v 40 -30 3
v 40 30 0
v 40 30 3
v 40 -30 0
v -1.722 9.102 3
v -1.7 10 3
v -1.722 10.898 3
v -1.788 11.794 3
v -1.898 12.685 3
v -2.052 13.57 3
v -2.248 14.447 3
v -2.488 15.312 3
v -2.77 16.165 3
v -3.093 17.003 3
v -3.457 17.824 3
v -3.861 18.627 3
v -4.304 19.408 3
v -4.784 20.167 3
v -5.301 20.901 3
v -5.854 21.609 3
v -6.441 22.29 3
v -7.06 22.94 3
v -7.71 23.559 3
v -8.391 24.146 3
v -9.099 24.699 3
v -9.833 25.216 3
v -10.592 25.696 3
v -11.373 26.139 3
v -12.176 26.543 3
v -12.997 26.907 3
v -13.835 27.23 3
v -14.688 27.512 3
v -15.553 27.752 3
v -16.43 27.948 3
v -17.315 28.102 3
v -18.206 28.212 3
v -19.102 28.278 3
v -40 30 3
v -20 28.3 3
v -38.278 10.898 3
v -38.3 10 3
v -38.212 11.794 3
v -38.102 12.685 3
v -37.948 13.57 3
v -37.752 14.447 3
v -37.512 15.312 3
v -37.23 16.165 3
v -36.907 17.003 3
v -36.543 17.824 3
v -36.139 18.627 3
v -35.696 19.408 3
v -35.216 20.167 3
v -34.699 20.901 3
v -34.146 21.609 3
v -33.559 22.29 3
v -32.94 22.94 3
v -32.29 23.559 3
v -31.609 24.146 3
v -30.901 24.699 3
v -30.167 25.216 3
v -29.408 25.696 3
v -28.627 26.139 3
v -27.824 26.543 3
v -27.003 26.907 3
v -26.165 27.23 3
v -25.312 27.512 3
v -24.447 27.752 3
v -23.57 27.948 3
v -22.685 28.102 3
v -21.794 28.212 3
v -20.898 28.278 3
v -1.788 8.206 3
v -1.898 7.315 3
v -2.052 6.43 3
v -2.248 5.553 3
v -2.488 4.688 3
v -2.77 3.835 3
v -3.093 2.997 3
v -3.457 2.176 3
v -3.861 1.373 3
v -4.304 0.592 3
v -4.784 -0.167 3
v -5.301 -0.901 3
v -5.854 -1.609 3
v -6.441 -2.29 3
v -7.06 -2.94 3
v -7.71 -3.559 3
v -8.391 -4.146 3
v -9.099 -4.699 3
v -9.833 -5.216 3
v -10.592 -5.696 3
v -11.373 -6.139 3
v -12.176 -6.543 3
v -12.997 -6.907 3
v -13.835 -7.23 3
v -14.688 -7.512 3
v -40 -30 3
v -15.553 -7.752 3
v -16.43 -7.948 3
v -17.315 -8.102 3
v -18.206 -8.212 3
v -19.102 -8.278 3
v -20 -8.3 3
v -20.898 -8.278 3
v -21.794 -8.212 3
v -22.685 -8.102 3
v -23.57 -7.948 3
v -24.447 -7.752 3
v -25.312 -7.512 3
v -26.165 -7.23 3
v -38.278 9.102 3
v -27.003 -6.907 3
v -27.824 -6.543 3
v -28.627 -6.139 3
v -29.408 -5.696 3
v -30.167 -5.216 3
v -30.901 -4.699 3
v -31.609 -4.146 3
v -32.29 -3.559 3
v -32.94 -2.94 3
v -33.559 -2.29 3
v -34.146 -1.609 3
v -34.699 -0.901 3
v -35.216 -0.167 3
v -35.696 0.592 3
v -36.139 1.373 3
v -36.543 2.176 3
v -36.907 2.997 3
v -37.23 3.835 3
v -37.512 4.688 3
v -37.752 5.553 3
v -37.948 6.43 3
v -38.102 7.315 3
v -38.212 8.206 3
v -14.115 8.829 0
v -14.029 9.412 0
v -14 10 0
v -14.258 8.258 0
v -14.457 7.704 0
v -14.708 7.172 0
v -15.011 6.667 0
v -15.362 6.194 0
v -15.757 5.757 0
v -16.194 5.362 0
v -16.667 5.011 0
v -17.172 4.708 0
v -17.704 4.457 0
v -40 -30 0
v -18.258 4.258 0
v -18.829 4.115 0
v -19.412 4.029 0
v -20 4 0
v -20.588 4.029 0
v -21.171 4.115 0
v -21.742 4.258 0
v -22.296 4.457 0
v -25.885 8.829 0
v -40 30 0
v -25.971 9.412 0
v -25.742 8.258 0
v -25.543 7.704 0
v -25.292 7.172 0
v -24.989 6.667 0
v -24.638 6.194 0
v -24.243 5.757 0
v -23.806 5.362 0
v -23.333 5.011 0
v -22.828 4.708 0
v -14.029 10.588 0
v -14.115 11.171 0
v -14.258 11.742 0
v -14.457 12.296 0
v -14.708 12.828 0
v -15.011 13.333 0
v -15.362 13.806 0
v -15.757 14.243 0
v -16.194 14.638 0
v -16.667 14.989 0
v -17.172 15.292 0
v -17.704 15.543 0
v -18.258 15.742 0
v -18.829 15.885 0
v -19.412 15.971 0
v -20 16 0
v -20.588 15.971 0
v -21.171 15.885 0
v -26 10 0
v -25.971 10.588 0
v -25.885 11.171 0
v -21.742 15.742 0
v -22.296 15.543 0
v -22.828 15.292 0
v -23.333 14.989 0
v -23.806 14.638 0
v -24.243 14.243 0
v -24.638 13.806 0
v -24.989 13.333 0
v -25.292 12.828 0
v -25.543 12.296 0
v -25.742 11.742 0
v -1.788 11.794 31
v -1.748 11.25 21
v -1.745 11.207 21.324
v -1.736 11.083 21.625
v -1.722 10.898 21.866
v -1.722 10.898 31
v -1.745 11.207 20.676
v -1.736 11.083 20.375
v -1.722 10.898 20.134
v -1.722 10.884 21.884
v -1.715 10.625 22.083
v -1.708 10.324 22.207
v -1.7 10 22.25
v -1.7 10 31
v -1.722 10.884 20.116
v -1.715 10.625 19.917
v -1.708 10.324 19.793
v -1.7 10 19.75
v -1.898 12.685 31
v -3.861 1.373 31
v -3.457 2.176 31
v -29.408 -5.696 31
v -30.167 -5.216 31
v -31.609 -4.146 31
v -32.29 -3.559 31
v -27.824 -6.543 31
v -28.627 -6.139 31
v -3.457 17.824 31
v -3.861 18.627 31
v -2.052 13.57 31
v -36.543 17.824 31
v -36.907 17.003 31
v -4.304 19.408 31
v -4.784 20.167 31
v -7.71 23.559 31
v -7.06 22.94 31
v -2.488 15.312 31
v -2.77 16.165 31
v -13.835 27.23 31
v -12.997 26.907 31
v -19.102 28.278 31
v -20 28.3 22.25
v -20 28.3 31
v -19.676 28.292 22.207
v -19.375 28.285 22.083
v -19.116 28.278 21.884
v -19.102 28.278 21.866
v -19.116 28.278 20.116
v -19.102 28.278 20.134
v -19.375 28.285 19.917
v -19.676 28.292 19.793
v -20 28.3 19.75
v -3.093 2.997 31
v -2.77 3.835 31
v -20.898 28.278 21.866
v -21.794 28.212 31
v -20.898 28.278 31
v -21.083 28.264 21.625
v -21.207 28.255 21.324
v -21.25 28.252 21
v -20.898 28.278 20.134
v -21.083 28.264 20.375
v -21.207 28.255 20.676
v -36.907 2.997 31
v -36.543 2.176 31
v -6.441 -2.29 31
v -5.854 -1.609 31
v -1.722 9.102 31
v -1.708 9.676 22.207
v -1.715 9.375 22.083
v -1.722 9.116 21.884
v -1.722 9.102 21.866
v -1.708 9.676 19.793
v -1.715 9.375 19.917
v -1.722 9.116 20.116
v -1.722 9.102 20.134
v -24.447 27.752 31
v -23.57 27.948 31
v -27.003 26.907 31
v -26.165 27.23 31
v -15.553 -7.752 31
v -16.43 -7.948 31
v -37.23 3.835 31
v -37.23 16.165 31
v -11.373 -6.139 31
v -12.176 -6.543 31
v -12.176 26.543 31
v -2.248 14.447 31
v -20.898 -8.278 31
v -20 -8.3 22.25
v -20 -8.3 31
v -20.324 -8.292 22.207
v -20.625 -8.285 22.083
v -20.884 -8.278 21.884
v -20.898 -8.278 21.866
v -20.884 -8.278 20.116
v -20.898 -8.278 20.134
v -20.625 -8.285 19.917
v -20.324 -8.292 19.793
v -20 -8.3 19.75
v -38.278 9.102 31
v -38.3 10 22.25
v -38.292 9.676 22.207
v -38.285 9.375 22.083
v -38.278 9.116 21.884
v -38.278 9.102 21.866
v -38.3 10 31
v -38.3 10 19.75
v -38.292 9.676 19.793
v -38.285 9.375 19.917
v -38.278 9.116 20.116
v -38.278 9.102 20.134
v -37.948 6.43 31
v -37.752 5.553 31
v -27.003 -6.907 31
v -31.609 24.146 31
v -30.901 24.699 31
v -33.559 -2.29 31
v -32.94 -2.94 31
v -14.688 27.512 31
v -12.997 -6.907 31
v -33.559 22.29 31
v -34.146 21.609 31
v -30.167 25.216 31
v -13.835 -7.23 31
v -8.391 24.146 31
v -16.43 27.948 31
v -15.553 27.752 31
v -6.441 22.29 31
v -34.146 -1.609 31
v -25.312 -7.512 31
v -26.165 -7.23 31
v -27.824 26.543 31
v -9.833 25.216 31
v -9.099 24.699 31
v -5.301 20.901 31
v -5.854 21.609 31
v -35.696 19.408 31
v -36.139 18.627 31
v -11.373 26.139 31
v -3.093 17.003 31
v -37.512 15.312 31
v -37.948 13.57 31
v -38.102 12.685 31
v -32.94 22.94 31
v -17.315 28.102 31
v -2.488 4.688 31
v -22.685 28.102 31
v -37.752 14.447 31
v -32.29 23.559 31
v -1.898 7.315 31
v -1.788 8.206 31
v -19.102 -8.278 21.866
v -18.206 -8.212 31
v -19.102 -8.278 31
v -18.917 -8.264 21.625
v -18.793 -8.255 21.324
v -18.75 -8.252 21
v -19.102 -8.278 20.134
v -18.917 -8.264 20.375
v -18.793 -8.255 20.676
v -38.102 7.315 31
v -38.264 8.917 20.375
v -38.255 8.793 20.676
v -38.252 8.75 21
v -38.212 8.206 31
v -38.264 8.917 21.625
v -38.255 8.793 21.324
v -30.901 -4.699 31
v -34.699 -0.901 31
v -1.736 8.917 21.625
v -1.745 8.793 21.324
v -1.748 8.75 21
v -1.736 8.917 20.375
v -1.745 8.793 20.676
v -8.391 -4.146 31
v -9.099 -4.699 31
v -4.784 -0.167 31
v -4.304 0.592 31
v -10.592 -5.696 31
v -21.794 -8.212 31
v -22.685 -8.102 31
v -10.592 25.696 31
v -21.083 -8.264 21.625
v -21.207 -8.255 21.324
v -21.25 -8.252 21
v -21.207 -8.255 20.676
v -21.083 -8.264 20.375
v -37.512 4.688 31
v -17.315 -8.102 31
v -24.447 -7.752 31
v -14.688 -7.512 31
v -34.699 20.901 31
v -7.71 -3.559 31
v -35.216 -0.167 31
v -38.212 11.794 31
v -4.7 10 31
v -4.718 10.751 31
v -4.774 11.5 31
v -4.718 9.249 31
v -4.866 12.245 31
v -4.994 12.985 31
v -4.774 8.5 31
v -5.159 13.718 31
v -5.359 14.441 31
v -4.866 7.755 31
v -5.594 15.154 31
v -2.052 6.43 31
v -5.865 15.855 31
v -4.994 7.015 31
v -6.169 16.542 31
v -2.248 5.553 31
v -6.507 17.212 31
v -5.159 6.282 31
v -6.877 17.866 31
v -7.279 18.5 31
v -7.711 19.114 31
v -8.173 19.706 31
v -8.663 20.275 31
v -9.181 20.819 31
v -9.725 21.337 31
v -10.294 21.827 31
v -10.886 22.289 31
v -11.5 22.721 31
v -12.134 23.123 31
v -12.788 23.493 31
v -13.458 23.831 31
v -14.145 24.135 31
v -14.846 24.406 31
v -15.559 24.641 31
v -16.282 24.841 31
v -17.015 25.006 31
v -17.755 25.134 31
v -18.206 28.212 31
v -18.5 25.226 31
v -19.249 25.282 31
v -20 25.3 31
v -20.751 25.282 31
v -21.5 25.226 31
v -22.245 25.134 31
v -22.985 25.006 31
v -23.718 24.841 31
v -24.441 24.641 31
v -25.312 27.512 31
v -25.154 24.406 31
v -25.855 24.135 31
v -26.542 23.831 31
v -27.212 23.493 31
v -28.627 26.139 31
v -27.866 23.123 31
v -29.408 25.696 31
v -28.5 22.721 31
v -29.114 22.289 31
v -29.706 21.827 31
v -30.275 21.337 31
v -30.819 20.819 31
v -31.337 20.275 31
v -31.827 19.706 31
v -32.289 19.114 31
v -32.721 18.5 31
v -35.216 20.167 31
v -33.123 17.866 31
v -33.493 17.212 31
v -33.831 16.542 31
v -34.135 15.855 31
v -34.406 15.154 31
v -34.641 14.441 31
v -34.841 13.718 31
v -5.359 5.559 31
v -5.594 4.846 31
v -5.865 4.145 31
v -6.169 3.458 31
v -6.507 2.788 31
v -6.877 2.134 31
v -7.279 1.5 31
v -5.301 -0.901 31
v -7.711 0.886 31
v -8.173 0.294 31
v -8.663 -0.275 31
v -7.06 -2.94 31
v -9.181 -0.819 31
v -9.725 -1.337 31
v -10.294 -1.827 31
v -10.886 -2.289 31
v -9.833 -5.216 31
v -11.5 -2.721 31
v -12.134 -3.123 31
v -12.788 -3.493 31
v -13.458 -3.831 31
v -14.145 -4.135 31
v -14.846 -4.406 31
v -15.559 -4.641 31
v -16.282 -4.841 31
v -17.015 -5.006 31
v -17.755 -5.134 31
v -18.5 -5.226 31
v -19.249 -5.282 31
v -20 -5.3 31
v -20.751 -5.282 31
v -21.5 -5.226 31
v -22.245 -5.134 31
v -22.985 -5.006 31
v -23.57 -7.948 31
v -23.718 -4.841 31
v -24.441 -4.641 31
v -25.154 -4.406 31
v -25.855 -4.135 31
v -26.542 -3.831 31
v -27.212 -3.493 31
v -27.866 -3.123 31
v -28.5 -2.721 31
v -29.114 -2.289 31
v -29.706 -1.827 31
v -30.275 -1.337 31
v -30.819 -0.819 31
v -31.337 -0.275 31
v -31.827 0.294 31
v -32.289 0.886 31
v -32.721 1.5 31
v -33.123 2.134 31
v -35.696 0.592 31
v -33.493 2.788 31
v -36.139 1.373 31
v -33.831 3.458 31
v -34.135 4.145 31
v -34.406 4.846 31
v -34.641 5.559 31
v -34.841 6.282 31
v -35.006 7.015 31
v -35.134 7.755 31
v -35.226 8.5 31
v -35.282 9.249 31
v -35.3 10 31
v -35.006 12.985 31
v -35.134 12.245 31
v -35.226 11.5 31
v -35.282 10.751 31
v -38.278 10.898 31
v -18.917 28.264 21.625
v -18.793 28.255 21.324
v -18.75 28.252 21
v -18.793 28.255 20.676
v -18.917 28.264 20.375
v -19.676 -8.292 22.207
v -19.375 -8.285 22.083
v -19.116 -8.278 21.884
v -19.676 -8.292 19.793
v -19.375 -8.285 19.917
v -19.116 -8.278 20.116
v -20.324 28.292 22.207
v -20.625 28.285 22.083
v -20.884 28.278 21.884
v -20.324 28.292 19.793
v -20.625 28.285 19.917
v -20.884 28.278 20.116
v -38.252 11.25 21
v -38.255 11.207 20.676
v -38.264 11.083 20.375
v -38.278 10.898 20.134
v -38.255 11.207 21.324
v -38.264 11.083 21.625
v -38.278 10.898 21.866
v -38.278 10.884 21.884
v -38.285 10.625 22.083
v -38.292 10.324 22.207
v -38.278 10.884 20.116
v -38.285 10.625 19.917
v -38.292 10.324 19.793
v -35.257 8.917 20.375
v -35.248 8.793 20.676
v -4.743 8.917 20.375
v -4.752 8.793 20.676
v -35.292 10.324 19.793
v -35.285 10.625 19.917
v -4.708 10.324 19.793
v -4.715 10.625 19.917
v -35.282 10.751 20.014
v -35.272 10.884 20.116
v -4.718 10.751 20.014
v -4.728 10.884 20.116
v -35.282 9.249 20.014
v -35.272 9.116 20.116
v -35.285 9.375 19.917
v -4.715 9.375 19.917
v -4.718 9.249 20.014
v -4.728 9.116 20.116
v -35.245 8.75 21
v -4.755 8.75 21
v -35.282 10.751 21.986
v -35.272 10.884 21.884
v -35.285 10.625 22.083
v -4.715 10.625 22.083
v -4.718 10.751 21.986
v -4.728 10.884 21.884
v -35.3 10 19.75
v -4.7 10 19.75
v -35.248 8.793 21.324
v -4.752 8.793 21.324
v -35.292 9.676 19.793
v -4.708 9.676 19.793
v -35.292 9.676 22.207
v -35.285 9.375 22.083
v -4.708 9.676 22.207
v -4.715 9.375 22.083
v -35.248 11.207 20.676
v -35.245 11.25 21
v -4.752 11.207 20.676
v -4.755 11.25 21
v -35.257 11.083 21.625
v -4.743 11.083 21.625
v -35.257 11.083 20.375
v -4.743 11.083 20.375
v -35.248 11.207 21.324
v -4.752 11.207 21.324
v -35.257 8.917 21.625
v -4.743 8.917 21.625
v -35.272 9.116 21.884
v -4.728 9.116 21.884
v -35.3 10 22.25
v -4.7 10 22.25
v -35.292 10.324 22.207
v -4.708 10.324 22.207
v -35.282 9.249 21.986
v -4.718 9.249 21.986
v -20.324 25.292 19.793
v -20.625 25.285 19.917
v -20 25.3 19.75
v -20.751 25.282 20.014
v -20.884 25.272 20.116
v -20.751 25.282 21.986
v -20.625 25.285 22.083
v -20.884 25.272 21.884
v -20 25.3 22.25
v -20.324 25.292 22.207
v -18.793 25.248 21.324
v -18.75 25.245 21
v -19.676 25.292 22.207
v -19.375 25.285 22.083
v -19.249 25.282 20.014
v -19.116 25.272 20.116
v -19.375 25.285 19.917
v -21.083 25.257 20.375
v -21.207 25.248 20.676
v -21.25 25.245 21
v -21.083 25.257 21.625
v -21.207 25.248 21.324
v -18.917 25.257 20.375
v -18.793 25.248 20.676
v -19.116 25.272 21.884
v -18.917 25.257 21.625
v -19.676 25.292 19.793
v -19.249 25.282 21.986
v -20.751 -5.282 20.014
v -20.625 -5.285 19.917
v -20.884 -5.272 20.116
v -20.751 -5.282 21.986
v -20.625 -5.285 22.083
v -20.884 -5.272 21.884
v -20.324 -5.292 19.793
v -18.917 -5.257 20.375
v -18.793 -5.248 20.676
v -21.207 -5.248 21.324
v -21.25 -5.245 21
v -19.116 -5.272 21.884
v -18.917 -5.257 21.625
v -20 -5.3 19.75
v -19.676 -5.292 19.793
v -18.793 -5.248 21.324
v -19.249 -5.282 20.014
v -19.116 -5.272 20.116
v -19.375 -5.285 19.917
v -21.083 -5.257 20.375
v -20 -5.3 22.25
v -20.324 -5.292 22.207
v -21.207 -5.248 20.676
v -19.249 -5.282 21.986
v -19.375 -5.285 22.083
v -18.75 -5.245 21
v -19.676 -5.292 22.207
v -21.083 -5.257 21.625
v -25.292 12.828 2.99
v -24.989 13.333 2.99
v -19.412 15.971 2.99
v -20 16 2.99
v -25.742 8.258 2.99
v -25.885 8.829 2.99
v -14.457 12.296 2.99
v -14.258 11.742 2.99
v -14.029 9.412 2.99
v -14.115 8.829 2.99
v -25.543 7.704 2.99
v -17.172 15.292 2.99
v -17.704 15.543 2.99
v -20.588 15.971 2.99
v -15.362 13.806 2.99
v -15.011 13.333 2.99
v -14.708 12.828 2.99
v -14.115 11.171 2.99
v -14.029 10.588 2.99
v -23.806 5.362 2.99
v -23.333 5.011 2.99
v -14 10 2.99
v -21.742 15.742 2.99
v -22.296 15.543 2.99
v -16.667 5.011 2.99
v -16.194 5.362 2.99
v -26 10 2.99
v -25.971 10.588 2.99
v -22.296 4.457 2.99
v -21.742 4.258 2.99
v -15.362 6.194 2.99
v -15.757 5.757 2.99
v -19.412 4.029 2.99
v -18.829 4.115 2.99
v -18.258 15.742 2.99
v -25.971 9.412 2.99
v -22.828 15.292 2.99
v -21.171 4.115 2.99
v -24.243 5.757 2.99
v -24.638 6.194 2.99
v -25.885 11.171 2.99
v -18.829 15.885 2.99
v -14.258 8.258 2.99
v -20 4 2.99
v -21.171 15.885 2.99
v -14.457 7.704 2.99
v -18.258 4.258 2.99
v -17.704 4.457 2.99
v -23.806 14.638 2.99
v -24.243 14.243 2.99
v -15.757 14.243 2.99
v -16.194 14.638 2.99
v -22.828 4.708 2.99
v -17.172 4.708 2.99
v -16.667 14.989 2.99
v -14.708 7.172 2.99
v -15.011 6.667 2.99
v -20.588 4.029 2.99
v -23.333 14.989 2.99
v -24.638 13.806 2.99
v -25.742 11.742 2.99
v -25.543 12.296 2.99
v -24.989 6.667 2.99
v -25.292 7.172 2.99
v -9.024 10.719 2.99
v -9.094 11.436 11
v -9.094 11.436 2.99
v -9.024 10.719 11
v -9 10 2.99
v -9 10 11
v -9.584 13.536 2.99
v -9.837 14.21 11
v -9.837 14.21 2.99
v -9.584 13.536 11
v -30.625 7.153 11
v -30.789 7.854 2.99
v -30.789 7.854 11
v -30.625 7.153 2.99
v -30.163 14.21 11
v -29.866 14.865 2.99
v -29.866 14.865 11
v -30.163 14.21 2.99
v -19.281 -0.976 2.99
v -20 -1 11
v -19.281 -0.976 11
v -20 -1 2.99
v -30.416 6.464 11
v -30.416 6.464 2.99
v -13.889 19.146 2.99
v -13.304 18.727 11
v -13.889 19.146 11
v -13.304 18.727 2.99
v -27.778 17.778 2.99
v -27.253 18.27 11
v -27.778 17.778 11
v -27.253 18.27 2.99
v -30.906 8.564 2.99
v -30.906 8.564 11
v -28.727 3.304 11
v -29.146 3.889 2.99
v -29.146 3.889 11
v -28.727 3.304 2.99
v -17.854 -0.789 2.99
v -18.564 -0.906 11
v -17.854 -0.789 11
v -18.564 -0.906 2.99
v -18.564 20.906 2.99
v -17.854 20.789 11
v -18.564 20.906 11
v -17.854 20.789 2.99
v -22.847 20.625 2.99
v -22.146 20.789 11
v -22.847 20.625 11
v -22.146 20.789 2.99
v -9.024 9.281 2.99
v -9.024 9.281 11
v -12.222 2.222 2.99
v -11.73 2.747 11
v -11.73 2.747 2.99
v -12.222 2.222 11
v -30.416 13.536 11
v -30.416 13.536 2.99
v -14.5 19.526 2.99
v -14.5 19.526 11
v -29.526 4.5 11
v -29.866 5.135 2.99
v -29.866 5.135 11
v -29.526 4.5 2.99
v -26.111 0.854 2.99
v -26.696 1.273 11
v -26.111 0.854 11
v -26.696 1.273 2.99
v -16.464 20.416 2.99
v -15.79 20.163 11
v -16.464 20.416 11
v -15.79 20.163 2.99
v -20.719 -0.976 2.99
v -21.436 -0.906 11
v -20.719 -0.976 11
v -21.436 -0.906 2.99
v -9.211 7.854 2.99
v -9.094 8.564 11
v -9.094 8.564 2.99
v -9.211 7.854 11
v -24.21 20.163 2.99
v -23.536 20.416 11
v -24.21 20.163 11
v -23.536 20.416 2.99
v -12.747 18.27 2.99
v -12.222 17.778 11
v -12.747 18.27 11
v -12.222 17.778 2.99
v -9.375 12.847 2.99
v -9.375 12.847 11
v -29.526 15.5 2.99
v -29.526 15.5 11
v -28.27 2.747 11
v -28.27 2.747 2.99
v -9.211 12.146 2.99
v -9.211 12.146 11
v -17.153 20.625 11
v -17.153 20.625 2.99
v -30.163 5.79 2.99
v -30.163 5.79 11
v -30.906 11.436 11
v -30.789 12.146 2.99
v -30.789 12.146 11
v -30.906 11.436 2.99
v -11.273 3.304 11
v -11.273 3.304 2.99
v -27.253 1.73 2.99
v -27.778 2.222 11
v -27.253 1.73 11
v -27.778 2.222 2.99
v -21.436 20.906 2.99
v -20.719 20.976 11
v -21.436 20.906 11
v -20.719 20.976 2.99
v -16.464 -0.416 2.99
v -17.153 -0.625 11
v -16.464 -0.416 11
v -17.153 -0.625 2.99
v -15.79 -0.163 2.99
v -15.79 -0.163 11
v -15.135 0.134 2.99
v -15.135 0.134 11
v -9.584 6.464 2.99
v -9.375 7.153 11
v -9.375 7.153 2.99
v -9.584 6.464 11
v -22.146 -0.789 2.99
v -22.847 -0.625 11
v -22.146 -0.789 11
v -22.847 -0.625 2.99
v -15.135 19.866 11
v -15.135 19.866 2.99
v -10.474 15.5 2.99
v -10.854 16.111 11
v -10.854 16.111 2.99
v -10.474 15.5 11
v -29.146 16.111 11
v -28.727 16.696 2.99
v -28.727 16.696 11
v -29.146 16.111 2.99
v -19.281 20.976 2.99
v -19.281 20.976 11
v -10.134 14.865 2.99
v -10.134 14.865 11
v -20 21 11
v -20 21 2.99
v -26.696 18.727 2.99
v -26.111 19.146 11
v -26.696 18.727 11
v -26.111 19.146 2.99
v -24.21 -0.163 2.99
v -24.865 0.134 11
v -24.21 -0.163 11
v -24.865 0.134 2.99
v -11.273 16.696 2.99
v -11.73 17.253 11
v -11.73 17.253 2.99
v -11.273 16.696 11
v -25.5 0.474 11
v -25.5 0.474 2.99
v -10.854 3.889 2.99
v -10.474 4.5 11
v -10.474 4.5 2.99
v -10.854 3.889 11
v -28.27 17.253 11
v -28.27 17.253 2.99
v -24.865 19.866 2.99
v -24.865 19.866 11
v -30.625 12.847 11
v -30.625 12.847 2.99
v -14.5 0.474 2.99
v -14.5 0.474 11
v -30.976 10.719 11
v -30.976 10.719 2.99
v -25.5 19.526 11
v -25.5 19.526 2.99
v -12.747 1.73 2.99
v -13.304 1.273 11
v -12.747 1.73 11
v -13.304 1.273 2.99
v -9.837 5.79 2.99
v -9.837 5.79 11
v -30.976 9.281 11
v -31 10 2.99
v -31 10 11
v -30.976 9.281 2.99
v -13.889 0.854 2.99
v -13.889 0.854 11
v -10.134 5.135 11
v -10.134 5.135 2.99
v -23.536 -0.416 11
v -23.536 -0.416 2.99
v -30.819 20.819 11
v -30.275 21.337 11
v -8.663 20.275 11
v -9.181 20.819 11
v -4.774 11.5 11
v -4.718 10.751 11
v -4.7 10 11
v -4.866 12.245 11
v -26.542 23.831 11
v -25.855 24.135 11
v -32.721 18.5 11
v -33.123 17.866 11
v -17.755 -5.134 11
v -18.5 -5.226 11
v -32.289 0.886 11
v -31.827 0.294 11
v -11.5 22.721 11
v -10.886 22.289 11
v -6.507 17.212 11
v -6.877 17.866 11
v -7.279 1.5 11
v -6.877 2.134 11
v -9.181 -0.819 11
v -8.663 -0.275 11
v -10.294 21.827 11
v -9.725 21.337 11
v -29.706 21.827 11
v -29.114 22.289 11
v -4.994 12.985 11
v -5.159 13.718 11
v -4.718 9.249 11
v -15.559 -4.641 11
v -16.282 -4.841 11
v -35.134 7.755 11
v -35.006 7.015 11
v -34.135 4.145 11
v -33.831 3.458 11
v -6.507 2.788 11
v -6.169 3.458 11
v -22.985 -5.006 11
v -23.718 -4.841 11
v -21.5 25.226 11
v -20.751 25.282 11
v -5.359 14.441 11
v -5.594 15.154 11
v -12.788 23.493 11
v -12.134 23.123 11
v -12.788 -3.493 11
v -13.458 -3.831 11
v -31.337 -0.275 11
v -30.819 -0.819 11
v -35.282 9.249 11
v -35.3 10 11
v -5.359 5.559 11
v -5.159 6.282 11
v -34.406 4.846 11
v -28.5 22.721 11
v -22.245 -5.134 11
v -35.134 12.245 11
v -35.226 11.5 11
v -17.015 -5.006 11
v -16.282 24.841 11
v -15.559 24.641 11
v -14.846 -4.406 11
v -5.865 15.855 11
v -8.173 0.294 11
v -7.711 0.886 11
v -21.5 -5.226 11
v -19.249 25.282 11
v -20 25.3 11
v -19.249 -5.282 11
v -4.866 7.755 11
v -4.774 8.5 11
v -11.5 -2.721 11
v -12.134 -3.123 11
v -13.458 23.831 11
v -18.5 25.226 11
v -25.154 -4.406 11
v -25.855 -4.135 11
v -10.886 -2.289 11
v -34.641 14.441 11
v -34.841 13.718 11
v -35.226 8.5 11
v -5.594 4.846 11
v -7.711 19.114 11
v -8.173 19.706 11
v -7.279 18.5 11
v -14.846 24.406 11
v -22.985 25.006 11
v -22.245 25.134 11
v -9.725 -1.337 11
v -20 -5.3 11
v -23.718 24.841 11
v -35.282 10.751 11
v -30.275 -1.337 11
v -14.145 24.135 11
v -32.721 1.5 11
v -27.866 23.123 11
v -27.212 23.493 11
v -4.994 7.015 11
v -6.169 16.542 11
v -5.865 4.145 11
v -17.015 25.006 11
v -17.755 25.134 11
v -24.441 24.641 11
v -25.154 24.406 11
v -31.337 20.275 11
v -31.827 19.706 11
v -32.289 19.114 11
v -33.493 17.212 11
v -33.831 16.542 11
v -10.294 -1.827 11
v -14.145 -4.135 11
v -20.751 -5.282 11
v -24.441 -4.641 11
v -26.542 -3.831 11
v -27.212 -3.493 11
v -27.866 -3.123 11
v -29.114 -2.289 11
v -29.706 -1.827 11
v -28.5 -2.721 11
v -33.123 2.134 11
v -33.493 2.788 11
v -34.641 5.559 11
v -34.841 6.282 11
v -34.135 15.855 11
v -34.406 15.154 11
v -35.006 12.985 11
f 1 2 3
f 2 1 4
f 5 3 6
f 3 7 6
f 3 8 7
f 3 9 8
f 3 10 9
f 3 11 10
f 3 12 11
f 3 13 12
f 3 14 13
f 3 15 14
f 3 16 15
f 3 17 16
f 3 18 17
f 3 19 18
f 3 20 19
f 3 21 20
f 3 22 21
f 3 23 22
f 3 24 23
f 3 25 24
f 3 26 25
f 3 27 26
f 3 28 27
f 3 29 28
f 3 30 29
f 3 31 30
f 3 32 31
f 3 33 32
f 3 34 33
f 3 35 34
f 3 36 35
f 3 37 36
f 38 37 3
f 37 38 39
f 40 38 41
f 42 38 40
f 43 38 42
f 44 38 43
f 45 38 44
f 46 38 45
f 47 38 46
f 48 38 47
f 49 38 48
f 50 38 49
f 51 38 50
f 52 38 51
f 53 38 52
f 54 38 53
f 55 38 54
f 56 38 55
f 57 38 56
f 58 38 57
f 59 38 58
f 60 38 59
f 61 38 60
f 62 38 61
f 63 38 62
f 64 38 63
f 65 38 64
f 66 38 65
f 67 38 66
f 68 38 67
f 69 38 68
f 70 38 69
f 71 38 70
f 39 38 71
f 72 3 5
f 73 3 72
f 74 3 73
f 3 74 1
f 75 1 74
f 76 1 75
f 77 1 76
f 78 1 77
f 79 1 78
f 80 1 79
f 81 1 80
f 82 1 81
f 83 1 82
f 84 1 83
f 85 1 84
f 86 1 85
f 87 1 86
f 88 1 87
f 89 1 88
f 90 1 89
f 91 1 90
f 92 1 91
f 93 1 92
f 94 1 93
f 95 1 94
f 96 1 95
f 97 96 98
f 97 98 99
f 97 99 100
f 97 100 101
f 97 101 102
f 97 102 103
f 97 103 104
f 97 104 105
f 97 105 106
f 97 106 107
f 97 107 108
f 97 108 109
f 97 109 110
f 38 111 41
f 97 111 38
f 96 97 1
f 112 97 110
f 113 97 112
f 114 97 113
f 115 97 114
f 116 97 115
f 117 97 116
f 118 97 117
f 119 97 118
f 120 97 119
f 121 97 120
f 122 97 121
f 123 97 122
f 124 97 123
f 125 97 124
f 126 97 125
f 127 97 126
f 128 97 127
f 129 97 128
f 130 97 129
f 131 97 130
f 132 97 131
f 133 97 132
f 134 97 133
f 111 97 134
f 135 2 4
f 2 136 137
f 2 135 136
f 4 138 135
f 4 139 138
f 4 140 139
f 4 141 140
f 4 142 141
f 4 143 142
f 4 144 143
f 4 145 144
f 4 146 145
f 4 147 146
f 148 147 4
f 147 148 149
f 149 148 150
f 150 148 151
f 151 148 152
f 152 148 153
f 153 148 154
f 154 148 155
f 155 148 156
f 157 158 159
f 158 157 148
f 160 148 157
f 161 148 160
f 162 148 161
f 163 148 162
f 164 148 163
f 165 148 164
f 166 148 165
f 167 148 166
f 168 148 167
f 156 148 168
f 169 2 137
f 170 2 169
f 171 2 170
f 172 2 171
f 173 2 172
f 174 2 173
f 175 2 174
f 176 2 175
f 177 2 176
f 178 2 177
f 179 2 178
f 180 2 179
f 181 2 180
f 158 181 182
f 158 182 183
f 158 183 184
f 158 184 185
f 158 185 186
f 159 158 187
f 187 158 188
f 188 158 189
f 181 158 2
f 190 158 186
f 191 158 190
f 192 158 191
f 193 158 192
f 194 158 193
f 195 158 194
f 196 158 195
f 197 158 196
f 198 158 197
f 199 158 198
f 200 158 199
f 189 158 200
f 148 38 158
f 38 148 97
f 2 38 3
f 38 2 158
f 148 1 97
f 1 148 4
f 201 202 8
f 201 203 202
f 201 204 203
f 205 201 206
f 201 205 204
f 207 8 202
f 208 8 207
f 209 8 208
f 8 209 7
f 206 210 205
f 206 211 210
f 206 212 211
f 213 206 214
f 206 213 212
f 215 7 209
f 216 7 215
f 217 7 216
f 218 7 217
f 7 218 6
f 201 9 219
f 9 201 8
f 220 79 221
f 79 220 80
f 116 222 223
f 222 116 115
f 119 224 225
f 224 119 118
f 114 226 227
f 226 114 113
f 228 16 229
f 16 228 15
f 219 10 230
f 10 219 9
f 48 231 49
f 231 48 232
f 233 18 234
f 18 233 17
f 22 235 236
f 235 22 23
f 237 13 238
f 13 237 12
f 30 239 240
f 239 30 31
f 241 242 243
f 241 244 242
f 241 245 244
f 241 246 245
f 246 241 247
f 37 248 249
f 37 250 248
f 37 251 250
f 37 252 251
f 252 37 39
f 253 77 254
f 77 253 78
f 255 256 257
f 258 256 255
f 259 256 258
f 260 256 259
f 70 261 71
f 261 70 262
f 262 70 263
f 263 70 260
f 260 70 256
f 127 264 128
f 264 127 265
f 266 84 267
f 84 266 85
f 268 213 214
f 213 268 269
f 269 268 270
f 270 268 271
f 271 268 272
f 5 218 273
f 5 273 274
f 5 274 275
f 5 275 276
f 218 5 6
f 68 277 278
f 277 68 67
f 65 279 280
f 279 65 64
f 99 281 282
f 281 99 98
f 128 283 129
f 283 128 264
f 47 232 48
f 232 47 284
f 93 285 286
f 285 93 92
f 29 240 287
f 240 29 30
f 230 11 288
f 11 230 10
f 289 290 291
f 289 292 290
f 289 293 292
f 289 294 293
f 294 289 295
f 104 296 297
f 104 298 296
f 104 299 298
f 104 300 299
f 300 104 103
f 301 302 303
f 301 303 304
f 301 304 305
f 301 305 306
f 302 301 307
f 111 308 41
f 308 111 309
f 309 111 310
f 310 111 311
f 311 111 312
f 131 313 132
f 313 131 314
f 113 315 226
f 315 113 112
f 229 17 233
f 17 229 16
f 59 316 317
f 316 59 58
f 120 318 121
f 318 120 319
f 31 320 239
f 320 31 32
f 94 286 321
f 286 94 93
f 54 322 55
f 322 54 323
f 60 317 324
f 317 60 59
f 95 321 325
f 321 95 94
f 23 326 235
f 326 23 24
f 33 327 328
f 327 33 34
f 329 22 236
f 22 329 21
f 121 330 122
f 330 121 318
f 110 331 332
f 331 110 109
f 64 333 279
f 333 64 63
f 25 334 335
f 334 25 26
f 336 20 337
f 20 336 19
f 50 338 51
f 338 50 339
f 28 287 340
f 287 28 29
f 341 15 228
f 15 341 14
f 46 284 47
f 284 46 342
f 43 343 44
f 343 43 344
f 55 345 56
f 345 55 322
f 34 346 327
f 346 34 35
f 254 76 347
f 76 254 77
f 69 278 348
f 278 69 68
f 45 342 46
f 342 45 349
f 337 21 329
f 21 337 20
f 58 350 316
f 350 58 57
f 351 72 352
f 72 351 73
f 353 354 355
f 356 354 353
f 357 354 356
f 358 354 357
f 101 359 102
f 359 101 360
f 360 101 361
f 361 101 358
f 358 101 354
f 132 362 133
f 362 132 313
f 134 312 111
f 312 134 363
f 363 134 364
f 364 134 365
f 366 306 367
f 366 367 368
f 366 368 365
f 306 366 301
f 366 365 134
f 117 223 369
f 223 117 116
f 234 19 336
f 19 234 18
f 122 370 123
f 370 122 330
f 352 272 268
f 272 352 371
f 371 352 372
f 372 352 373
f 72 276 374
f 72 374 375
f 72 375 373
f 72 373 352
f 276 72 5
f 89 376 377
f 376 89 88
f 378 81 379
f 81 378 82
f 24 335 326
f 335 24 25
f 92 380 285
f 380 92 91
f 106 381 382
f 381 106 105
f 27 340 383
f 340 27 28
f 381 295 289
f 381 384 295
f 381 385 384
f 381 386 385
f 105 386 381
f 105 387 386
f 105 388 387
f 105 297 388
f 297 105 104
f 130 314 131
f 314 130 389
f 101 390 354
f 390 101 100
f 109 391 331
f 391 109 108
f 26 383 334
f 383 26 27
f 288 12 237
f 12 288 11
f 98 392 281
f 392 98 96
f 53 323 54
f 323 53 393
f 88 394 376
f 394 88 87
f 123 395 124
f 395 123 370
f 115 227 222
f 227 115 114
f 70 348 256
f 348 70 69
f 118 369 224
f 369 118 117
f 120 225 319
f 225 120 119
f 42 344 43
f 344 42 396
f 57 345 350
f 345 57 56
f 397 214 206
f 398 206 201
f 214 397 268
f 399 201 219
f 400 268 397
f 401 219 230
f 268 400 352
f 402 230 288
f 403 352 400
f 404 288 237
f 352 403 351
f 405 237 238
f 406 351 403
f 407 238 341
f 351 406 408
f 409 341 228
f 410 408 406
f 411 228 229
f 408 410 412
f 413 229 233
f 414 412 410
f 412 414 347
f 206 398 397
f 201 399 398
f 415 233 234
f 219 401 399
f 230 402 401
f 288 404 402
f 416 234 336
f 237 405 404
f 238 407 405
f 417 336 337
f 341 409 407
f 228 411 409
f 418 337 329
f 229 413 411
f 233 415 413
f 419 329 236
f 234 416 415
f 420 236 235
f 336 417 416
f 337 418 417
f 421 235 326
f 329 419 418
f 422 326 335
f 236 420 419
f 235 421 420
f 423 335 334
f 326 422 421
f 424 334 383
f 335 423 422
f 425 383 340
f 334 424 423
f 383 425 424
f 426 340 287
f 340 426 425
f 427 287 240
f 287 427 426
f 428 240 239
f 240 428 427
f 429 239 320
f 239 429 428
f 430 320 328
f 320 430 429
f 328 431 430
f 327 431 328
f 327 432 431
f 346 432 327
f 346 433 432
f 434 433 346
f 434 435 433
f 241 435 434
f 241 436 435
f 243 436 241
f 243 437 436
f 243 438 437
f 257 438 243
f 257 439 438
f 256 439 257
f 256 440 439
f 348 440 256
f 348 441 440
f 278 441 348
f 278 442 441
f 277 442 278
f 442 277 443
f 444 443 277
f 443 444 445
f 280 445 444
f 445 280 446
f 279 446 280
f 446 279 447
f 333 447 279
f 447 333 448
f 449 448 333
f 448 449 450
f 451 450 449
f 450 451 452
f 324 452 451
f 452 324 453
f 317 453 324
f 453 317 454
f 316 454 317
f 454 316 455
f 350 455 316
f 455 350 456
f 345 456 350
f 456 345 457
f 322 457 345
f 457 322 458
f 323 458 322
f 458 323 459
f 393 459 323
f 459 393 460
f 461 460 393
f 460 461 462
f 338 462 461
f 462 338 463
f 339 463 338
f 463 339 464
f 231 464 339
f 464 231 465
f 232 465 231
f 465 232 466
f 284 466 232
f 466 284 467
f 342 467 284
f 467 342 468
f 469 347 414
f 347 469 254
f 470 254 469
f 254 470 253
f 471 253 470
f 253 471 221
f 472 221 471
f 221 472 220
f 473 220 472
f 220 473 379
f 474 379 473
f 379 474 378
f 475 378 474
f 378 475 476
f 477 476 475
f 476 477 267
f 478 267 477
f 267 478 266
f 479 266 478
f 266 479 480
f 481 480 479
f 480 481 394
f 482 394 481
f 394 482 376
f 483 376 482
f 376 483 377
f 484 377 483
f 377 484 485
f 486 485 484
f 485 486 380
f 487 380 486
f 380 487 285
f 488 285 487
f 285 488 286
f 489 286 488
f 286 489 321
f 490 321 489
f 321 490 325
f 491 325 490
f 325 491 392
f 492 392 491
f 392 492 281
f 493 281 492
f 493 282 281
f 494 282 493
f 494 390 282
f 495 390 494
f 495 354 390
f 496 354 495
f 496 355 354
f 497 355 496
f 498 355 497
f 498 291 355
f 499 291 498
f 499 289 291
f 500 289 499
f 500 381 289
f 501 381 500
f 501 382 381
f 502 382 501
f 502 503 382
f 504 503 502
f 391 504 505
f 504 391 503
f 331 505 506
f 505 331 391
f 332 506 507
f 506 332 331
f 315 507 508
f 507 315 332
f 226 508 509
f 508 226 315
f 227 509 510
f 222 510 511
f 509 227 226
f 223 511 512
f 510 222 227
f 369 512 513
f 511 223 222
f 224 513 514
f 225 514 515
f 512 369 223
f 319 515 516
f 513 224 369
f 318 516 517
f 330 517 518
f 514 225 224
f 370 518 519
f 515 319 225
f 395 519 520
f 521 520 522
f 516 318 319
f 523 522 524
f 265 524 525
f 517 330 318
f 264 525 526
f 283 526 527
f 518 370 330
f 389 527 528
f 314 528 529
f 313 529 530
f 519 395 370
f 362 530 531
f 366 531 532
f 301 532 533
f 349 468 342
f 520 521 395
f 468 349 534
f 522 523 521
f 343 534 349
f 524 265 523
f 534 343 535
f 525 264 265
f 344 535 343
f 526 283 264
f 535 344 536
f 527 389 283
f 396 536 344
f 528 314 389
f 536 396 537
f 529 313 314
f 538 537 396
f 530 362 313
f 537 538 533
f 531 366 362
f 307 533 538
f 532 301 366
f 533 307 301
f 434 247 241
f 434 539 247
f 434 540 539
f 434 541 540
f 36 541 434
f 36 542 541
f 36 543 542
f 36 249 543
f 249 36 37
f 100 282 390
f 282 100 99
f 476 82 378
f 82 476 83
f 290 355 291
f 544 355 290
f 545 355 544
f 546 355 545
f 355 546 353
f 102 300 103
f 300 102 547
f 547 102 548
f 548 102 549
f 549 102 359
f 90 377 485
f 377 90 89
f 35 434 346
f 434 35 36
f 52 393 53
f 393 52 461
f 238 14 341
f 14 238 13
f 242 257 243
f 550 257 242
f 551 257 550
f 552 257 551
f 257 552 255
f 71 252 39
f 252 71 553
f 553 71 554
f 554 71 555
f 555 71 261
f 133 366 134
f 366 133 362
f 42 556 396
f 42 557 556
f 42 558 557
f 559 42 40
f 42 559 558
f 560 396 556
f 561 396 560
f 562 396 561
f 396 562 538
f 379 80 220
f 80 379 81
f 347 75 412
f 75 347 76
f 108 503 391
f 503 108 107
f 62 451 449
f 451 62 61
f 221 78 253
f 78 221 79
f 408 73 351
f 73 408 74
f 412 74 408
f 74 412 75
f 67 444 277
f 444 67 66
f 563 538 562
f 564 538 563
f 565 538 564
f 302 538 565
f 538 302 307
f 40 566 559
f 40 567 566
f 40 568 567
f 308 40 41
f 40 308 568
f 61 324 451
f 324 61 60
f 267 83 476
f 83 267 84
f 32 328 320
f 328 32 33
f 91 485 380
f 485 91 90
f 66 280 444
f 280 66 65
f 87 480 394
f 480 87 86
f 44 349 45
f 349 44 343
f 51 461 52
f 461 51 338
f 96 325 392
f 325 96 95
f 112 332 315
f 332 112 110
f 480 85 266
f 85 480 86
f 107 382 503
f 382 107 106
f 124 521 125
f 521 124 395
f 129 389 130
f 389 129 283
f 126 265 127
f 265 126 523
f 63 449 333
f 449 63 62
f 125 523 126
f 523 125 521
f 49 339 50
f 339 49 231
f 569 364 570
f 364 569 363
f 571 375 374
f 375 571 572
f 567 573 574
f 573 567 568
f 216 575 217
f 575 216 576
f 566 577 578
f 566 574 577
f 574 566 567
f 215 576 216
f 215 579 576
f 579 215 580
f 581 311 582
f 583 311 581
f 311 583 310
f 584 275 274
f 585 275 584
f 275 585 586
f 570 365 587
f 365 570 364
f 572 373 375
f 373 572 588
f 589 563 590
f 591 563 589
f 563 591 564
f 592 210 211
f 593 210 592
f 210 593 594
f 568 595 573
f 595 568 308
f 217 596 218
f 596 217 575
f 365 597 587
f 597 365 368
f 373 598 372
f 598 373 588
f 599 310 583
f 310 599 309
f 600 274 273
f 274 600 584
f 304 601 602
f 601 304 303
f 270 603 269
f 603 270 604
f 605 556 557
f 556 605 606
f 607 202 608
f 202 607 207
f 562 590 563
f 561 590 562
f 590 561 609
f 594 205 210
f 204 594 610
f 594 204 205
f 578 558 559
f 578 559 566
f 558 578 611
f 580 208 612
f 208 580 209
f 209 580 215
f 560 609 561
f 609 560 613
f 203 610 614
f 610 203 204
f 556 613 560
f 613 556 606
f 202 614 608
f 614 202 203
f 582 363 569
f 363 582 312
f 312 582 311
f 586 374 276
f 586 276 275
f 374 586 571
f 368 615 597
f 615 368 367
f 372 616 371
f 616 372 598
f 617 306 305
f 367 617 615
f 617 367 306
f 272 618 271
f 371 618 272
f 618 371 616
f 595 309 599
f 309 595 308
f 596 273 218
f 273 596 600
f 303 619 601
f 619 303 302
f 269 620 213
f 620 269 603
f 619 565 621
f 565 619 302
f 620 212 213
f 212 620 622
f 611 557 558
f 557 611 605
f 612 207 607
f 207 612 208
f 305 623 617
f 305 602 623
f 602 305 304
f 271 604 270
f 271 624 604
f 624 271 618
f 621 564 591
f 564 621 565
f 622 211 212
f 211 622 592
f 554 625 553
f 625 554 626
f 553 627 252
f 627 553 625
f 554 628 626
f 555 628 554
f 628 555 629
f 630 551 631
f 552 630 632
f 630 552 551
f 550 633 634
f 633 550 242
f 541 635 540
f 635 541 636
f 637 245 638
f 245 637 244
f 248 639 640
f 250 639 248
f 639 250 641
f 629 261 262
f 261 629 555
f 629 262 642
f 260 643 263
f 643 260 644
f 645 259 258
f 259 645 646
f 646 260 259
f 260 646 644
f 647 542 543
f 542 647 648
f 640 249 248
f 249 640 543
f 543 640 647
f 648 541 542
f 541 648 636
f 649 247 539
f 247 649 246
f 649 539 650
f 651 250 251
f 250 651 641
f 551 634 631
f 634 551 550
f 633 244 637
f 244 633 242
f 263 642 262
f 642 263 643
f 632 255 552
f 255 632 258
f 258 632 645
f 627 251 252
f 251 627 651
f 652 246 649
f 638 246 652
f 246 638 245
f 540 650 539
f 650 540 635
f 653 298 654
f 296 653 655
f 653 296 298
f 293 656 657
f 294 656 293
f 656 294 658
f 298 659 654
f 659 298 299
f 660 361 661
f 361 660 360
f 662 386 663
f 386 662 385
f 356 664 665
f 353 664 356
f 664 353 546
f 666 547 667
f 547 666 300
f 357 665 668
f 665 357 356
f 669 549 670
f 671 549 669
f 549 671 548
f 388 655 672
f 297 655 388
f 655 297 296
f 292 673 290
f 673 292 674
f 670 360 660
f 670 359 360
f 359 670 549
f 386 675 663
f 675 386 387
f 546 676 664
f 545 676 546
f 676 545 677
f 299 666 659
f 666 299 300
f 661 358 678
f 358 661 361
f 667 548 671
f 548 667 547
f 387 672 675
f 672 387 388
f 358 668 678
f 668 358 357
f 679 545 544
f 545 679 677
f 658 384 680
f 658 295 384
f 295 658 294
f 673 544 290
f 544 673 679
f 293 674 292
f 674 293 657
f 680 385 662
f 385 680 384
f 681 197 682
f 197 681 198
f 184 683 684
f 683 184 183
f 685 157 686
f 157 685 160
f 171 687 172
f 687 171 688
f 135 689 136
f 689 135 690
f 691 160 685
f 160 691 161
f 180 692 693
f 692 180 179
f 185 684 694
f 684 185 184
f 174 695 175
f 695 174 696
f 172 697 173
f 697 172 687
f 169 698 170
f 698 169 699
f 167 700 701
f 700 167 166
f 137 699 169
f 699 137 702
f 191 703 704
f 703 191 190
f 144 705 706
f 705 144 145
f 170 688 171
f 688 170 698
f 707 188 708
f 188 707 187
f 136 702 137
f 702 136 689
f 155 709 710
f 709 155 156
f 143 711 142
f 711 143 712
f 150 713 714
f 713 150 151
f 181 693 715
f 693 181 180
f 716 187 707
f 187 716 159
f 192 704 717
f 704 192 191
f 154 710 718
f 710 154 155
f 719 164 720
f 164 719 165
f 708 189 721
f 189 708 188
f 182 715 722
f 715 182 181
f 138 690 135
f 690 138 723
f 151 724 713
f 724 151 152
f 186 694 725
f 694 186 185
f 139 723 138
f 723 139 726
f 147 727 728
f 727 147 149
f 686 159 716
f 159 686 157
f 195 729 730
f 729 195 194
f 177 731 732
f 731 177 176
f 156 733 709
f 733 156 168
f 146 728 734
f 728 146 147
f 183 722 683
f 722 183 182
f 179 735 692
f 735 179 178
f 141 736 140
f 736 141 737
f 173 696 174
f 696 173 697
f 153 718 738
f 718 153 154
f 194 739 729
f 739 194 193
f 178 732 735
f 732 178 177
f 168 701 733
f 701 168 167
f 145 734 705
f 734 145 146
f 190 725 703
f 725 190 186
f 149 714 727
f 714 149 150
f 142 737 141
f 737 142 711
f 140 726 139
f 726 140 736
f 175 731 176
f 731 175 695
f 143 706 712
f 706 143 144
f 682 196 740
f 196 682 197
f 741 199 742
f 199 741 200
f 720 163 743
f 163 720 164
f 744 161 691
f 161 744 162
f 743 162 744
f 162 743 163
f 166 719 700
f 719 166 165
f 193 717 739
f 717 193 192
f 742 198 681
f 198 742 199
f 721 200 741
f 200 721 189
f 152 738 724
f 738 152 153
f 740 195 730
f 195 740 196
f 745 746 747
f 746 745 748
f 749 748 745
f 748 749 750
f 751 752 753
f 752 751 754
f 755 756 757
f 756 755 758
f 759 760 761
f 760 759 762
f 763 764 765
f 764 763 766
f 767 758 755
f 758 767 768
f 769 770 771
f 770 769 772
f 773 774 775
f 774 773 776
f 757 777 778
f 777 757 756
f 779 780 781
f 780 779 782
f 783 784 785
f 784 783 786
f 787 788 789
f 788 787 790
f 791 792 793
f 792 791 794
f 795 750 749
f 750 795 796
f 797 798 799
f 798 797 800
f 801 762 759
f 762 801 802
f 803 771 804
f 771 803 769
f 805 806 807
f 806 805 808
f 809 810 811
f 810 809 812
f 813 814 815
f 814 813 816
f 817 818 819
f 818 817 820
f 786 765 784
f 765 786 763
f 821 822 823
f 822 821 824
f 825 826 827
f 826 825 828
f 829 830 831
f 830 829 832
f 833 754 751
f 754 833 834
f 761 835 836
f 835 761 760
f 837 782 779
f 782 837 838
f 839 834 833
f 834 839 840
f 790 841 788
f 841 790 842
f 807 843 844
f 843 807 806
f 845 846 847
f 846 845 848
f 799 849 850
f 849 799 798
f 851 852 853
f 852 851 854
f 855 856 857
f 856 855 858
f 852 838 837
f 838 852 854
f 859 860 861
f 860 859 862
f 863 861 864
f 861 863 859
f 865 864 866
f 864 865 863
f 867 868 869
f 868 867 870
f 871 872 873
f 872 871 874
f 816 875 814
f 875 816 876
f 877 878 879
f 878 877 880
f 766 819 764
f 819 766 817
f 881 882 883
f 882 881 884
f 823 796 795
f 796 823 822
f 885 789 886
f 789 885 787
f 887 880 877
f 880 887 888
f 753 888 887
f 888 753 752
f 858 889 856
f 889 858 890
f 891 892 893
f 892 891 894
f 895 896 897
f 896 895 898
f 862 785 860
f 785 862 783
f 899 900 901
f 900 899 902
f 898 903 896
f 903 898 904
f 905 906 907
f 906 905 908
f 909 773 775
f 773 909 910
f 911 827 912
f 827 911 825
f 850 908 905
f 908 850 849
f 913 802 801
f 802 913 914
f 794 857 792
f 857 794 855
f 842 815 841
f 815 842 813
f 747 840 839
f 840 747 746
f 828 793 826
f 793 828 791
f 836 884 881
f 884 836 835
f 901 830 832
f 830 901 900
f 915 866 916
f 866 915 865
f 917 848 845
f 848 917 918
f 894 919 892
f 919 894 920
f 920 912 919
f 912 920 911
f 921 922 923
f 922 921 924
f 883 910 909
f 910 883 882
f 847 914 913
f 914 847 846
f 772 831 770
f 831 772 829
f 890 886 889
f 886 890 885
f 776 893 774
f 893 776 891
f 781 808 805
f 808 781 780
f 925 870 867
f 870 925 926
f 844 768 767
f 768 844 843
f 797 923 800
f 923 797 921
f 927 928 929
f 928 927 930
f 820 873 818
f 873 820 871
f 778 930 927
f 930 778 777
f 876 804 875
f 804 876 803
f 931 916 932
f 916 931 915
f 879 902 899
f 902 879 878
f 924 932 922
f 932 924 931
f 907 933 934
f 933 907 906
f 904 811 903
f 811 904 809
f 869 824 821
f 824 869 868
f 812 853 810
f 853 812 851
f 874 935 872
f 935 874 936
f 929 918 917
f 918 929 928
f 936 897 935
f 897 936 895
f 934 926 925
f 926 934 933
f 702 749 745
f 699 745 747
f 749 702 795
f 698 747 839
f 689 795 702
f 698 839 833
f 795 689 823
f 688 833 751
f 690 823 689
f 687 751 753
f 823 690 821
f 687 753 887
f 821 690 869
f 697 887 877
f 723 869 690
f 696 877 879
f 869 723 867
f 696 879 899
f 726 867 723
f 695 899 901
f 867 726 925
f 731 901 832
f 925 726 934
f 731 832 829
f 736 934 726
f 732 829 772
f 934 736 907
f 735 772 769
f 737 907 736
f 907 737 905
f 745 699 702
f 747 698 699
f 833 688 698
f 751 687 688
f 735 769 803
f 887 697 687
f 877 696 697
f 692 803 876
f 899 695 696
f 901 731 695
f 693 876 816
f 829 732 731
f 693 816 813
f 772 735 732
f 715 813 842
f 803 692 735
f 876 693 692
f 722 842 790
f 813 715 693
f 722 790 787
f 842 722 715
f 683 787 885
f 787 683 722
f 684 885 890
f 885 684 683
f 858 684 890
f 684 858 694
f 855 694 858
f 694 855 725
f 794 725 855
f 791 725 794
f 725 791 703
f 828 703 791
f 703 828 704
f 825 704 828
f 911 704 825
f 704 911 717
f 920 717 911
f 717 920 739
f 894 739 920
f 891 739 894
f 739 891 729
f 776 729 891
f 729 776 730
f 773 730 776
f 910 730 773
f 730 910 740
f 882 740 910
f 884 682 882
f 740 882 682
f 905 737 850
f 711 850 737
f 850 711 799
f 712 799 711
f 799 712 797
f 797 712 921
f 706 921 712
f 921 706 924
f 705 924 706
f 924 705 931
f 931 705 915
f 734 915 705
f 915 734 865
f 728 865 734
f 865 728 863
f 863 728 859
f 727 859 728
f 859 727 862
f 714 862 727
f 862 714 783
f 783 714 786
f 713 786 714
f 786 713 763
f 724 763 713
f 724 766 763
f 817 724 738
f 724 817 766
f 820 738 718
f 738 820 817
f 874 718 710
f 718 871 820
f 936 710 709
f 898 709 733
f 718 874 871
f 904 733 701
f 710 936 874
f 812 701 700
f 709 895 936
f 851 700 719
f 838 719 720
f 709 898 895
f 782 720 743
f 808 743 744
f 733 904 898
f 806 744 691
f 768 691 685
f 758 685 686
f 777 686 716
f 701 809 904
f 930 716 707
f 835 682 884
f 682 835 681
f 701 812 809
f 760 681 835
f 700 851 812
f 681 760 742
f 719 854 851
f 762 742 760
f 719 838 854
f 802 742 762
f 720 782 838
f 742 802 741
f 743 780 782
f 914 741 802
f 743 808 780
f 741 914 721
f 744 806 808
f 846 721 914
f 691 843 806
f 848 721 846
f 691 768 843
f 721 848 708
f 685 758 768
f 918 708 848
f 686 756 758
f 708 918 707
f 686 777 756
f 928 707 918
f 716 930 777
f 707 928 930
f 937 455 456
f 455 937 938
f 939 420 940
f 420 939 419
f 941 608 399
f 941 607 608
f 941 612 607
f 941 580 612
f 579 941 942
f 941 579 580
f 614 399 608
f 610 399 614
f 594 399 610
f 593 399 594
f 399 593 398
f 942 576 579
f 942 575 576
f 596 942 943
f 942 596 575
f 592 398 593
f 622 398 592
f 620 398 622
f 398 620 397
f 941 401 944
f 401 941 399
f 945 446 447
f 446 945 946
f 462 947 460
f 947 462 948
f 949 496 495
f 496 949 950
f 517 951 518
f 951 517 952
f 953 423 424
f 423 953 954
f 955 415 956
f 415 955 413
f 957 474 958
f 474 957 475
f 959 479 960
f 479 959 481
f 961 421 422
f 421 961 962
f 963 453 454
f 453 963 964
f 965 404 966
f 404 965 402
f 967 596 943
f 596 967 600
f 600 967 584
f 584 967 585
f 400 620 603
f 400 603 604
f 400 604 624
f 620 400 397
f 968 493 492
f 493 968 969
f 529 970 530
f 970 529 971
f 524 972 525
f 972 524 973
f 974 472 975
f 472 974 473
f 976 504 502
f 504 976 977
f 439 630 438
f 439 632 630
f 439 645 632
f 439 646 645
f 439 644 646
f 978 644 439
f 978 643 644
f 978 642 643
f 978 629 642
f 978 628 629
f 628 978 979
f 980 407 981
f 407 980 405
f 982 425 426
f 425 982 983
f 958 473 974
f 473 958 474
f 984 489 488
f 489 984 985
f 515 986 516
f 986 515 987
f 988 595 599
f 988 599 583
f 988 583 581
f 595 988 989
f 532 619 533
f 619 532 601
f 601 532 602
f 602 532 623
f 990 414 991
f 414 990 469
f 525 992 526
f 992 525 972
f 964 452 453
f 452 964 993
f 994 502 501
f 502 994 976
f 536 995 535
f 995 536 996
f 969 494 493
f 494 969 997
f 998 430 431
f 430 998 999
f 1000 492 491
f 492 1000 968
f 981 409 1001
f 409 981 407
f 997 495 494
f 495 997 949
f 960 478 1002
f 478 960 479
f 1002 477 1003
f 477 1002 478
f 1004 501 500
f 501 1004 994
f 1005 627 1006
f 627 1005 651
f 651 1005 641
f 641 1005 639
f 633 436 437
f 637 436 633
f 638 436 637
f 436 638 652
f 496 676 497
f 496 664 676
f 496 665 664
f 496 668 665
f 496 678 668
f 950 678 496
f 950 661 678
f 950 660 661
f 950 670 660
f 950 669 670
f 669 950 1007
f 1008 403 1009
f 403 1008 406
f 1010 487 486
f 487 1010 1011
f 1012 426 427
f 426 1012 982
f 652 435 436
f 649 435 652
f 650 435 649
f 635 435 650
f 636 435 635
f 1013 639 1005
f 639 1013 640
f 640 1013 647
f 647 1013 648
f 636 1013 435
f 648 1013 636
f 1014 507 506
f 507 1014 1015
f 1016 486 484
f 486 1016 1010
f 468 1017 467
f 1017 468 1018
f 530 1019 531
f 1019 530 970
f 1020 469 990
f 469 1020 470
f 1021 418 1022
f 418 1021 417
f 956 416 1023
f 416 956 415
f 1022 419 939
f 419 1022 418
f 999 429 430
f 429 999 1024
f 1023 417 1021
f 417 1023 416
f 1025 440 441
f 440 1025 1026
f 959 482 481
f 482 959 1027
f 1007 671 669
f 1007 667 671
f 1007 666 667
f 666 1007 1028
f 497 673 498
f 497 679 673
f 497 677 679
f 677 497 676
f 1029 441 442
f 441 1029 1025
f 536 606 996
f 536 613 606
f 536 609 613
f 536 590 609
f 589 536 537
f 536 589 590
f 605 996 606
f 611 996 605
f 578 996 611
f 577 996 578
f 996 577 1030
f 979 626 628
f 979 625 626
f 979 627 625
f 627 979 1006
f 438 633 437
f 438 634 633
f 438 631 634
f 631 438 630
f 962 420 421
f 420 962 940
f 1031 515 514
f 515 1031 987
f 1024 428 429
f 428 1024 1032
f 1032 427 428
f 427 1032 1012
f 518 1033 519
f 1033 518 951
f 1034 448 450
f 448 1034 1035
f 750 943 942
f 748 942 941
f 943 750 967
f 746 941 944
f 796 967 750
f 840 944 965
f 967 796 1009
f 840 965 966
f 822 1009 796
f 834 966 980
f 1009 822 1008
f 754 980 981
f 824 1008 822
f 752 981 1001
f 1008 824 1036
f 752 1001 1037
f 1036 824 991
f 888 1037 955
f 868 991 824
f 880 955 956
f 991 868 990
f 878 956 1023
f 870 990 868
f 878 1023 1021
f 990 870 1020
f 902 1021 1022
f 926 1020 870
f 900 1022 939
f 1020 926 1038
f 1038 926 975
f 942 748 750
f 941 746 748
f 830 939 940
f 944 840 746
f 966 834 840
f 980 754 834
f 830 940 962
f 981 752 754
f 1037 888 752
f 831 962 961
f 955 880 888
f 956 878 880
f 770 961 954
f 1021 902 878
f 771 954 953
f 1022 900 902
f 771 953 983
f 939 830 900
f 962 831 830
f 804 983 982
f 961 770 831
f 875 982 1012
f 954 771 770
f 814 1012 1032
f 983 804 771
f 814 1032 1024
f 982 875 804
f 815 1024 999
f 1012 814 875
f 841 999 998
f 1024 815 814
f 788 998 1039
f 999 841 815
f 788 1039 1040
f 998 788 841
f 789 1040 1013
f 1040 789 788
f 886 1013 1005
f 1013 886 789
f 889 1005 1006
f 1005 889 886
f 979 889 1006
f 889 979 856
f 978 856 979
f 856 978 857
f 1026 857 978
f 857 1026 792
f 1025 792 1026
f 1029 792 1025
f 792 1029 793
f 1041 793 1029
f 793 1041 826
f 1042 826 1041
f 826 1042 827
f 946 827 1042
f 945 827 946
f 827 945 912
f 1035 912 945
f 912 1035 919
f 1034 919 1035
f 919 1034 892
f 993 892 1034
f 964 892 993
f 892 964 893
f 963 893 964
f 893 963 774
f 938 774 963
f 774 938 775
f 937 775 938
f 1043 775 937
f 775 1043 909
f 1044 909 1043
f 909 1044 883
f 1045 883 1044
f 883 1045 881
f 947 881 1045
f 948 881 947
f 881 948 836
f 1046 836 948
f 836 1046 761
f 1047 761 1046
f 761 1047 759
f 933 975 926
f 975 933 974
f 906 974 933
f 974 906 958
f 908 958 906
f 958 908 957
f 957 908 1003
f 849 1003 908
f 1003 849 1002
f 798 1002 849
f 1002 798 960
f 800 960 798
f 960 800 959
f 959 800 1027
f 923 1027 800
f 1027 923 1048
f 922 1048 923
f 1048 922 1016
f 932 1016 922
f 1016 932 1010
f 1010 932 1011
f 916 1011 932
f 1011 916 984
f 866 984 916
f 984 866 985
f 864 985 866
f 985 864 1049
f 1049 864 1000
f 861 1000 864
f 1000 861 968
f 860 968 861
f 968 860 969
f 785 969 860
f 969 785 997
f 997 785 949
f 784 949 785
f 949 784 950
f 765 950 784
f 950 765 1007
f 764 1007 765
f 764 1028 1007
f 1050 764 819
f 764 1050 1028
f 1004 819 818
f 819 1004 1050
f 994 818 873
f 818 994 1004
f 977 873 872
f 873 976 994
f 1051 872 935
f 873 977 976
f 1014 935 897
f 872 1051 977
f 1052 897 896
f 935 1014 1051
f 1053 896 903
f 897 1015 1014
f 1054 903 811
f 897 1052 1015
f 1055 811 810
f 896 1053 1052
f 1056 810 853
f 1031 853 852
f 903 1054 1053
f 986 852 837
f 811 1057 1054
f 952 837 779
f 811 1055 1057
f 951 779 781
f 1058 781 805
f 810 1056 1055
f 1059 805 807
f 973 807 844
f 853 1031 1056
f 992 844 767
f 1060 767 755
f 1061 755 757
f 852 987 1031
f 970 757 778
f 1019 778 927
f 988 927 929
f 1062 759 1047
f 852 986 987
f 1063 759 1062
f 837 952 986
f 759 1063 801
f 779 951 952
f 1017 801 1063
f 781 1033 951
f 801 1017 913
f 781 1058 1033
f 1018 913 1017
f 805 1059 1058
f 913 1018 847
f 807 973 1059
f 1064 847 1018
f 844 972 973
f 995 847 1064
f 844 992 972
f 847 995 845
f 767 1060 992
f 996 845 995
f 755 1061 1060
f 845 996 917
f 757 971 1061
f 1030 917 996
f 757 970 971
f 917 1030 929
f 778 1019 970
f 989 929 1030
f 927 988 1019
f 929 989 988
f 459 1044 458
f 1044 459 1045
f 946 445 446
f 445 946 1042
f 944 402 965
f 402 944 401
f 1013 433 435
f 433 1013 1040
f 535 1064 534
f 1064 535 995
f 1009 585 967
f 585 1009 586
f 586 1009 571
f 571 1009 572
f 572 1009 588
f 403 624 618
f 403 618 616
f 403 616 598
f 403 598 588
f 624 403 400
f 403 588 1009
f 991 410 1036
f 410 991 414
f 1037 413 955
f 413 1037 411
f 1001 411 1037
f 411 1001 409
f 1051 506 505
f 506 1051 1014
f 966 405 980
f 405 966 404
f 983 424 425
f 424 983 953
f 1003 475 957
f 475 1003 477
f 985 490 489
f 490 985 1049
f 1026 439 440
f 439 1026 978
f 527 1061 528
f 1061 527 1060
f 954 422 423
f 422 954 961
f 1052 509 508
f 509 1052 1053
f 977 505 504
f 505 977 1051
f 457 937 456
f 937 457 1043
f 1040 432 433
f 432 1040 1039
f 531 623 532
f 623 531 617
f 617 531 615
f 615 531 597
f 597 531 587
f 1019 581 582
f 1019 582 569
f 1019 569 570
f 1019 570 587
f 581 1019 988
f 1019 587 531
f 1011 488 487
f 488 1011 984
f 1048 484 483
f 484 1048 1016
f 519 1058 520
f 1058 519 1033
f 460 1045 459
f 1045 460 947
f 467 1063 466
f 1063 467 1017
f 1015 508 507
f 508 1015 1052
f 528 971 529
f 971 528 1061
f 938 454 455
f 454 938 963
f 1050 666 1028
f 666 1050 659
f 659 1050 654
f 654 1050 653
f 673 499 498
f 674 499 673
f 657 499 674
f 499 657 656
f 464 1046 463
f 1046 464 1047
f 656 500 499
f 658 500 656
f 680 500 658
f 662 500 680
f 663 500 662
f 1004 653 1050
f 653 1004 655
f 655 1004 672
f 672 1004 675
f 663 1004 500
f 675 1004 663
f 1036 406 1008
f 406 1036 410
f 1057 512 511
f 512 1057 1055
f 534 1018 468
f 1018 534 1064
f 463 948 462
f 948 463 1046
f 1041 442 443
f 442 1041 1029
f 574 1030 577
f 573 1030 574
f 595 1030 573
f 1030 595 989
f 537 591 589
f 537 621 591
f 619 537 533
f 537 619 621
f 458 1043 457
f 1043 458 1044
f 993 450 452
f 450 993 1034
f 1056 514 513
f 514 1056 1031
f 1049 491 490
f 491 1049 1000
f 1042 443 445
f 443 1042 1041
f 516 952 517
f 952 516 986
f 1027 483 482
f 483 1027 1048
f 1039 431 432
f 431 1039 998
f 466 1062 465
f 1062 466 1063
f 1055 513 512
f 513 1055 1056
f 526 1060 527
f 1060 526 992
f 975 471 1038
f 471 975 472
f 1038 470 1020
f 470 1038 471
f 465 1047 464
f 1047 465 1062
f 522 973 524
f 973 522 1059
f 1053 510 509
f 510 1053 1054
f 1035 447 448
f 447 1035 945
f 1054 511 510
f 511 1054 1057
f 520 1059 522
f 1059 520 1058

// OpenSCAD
// KNOWN-WRONG PART (must fail): four radial screw holes 90 degrees apart instead of three
// Phone adapter for a microscope eyepiece with a 30 mm outer diameter
// Category: hardware. A phone plate with an off-centre camera hole and, on the same axis, a sleeve
// that slides over the eyepiece. The sleeve bore steps down to 22 mm near the plate (a stop that
// fixes the camera-to-eyepiece distance); three radial M3 holes take centring screws.
// Print: PLA or PETG, phone side (plate) on the bed, 0.2 mm layers; tap the 2.5 mm holes for M3
// nylon screws. Hold the phone on the plate with rubber bands.
// SPDX-License-Identifier: CERN-OHL-P-2.0

/* [Adapter] */
plate = [80, 60, 3];      // X, Y, thickness [mm], centred on the origin
cam = [-20, 10];          // camera-hole axis
cam_d = 12;
sleeve_od = 36.6;
stop_d = 22;              // bore from z = 3 to 11
stop_top = 11;
bore_d = 30.6;            // bore from z = 11 to the top (30 mm eyepiece + clearance)
sleeve_top = 31;
screw_d = 2.5;            // M3 tapping holes
screw_z = 21;
screw_angles = [0, 90, 180, 270];  // first one points in +X

/* [Hidden] */
eps = 0.01;

difference() {
    union() {
        translate([-plate.x / 2, -plate.y / 2, 0]) cube(plate);
        translate([cam.x, cam.y, plate.z - eps]) cylinder(d = sleeve_od, h = sleeve_top - plate.z + eps, $fn = 128);
    }
    translate([cam.x, cam.y, -1]) cylinder(d = cam_d, h = plate.z + 2, $fn = 64);
    translate([cam.x, cam.y, plate.z - eps]) cylinder(d = stop_d, h = stop_top - plate.z + 2 * eps, $fn = 96);
    translate([cam.x, cam.y, stop_top]) cylinder(d = bore_d, h = sleeve_top - stop_top + 1, $fn = 128);
    for (a = screw_angles)
        translate([cam.x, cam.y, screw_z]) rotate([0, 0, a]) rotate([0, 90, 0])
            cylinder(d = screw_d, h = sleeve_od / 2 + 1, $fn = 24);
}
